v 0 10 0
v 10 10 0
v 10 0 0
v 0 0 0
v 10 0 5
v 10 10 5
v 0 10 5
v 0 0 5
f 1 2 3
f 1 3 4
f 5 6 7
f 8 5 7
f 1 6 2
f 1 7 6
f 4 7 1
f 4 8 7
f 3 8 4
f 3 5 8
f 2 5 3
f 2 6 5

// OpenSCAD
linear_extrude(height = 5) polygon(points = [[0, 0], [10, 0], [10, 10], [0, 10]]);
